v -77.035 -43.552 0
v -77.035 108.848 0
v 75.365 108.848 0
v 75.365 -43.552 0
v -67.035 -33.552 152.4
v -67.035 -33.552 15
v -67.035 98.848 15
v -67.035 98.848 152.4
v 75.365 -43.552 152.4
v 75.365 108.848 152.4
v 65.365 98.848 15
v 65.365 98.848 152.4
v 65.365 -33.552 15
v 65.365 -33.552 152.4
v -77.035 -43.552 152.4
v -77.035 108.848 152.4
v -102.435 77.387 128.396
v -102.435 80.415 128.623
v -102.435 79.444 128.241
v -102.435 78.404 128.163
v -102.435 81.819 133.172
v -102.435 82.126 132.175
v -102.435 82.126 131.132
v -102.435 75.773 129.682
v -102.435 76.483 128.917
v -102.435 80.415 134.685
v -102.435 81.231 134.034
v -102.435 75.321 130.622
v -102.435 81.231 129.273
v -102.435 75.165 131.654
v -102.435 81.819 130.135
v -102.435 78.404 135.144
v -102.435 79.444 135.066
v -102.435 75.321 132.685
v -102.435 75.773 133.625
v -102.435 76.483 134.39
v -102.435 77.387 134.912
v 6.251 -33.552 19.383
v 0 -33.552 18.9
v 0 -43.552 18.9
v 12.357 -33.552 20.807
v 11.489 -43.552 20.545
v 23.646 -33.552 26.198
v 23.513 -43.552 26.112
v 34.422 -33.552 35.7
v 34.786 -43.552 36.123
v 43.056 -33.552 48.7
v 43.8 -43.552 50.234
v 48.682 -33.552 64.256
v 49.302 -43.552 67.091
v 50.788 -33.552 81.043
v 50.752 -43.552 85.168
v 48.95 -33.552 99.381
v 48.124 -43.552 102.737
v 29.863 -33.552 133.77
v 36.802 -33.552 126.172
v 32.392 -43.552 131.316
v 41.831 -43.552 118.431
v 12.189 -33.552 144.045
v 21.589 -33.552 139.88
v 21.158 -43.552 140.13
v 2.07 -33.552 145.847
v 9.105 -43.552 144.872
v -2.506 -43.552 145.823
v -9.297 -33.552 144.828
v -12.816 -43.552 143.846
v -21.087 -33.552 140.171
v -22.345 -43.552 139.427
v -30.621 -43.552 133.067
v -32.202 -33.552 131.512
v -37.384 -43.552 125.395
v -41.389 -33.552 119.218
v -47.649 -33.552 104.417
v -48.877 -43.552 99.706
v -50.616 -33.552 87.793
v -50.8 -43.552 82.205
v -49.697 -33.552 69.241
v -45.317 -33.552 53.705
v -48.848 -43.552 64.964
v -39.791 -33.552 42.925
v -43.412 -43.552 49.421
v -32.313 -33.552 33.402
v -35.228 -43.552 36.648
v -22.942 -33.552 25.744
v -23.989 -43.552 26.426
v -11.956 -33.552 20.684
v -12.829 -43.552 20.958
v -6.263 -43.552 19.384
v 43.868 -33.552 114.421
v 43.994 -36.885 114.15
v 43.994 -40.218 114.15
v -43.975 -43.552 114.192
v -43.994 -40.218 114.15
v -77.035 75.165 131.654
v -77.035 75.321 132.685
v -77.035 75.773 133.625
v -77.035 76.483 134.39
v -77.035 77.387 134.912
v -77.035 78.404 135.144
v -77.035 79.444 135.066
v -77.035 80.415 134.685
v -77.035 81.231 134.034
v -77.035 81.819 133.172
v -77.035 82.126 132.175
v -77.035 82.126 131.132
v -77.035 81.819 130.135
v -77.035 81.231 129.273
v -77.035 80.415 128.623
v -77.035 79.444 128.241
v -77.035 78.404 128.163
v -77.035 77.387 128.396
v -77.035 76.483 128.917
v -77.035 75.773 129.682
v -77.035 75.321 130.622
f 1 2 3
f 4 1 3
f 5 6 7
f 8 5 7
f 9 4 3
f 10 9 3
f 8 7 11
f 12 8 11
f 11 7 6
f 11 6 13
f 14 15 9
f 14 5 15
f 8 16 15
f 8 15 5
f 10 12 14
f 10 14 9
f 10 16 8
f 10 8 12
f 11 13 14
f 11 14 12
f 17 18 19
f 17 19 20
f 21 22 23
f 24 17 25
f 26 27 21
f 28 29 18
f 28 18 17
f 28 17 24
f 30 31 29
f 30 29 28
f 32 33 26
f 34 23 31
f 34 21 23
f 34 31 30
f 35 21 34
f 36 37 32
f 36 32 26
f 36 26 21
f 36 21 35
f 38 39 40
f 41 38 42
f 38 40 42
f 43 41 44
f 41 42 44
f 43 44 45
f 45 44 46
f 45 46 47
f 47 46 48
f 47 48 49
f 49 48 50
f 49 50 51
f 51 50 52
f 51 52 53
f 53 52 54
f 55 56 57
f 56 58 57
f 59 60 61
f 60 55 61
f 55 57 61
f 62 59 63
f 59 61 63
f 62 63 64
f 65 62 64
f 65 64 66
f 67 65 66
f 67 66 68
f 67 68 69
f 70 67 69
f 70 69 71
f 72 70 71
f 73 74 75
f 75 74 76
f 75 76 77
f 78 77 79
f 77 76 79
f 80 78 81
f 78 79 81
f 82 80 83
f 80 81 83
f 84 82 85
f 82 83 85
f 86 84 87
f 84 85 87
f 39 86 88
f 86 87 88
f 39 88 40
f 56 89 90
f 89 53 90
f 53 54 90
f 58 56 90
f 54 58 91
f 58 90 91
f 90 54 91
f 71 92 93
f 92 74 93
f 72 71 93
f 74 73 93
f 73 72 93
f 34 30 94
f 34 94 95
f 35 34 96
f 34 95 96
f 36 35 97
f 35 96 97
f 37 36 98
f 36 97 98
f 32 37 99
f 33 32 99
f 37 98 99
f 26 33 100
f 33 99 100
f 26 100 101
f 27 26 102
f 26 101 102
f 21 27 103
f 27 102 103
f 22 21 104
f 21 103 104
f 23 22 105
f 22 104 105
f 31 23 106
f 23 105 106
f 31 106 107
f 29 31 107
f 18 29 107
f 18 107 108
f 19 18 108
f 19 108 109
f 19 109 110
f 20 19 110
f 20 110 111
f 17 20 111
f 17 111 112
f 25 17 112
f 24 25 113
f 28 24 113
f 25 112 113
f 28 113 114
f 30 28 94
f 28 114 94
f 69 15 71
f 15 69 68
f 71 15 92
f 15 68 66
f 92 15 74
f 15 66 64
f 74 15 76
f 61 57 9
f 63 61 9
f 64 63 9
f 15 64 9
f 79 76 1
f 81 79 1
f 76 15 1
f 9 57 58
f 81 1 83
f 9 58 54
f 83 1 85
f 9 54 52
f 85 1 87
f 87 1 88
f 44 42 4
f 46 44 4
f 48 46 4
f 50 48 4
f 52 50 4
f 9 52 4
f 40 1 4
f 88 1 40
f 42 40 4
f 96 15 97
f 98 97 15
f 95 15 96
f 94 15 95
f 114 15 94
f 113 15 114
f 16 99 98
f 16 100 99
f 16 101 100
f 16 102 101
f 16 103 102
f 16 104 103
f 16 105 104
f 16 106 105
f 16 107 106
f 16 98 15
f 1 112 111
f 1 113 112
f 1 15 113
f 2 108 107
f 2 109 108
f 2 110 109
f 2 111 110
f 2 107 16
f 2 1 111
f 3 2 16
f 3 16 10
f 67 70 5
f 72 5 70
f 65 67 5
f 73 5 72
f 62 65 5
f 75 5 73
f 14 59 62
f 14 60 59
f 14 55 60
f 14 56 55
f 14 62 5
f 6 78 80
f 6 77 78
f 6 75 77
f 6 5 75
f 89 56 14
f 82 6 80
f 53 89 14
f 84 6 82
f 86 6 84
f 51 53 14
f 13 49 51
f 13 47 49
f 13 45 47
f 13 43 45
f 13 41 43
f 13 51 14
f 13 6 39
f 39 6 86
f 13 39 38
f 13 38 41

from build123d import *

# Parameters (mm, degrees)
F0_W     = 152.4
F0_H     = 152.4
F0_W_2   = 132.4
F0_H_2   = 132.4
F1_DEPTH = 152.4
F2_DEPTH = 15
F4_DEPTH = 25
F5_R     = 3.5
F6_DEPTH = 25.4


with BuildPart() as f1:
    # F0 (on Top) → F1 (new body)
    with BuildSketch(Plane.XY):
        with Locations((-0.835299, 32.648436)):
            Rectangle(F0_W, F0_H)
        with Locations((-0.835299, 32.648436)):
            Rectangle(F0_W_2, F0_H_2, mode=Mode.SUBTRACT)
    extrude(amount=F1_DEPTH)

    # F0 (on Top) → F2 (join)
    with BuildSketch(Plane.XY):
        with Locations((-0.835299, 32.648436)):
            Rectangle(F0_W_2, F0_H_2)
    extrude(amount=F2_DEPTH)

    # F3 (on face) → F4 (cut)
    with BuildSketch(Plane.XZ.offset(43.551564)):
        with BuildLine():
            add(Edge.make_bspline(
                [(0, 18.9), (87.988181, 18.9), (43.994091, 114.15), (0, 209.4), (-43.994091, 114.15), (-87.988181, 18.9), (0, 18.9)],
                knots=[0, 0, 0, 2.094395, 2.094395, 4.18879, 4.18879, 6.283185, 6.283185, 6.283185], degree=2, weights=[1, 0.5, 1, 0.5, 1, 0.5, 1]))
        make_face()
    extrude(amount=-F4_DEPTH, mode=Mode.SUBTRACT)

    # F5 (on face) → F6 (join)
    with BuildSketch(Plane(origin=(-77.035299, 0, 0), x_dir=(0, -1, 0), z_dir=(-1, 0, 0))):
        with Locations((-78.665249, 131.653592)):
            Circle(F5_R)
    extrude(amount=F6_DEPTH)


solid = f1.part
